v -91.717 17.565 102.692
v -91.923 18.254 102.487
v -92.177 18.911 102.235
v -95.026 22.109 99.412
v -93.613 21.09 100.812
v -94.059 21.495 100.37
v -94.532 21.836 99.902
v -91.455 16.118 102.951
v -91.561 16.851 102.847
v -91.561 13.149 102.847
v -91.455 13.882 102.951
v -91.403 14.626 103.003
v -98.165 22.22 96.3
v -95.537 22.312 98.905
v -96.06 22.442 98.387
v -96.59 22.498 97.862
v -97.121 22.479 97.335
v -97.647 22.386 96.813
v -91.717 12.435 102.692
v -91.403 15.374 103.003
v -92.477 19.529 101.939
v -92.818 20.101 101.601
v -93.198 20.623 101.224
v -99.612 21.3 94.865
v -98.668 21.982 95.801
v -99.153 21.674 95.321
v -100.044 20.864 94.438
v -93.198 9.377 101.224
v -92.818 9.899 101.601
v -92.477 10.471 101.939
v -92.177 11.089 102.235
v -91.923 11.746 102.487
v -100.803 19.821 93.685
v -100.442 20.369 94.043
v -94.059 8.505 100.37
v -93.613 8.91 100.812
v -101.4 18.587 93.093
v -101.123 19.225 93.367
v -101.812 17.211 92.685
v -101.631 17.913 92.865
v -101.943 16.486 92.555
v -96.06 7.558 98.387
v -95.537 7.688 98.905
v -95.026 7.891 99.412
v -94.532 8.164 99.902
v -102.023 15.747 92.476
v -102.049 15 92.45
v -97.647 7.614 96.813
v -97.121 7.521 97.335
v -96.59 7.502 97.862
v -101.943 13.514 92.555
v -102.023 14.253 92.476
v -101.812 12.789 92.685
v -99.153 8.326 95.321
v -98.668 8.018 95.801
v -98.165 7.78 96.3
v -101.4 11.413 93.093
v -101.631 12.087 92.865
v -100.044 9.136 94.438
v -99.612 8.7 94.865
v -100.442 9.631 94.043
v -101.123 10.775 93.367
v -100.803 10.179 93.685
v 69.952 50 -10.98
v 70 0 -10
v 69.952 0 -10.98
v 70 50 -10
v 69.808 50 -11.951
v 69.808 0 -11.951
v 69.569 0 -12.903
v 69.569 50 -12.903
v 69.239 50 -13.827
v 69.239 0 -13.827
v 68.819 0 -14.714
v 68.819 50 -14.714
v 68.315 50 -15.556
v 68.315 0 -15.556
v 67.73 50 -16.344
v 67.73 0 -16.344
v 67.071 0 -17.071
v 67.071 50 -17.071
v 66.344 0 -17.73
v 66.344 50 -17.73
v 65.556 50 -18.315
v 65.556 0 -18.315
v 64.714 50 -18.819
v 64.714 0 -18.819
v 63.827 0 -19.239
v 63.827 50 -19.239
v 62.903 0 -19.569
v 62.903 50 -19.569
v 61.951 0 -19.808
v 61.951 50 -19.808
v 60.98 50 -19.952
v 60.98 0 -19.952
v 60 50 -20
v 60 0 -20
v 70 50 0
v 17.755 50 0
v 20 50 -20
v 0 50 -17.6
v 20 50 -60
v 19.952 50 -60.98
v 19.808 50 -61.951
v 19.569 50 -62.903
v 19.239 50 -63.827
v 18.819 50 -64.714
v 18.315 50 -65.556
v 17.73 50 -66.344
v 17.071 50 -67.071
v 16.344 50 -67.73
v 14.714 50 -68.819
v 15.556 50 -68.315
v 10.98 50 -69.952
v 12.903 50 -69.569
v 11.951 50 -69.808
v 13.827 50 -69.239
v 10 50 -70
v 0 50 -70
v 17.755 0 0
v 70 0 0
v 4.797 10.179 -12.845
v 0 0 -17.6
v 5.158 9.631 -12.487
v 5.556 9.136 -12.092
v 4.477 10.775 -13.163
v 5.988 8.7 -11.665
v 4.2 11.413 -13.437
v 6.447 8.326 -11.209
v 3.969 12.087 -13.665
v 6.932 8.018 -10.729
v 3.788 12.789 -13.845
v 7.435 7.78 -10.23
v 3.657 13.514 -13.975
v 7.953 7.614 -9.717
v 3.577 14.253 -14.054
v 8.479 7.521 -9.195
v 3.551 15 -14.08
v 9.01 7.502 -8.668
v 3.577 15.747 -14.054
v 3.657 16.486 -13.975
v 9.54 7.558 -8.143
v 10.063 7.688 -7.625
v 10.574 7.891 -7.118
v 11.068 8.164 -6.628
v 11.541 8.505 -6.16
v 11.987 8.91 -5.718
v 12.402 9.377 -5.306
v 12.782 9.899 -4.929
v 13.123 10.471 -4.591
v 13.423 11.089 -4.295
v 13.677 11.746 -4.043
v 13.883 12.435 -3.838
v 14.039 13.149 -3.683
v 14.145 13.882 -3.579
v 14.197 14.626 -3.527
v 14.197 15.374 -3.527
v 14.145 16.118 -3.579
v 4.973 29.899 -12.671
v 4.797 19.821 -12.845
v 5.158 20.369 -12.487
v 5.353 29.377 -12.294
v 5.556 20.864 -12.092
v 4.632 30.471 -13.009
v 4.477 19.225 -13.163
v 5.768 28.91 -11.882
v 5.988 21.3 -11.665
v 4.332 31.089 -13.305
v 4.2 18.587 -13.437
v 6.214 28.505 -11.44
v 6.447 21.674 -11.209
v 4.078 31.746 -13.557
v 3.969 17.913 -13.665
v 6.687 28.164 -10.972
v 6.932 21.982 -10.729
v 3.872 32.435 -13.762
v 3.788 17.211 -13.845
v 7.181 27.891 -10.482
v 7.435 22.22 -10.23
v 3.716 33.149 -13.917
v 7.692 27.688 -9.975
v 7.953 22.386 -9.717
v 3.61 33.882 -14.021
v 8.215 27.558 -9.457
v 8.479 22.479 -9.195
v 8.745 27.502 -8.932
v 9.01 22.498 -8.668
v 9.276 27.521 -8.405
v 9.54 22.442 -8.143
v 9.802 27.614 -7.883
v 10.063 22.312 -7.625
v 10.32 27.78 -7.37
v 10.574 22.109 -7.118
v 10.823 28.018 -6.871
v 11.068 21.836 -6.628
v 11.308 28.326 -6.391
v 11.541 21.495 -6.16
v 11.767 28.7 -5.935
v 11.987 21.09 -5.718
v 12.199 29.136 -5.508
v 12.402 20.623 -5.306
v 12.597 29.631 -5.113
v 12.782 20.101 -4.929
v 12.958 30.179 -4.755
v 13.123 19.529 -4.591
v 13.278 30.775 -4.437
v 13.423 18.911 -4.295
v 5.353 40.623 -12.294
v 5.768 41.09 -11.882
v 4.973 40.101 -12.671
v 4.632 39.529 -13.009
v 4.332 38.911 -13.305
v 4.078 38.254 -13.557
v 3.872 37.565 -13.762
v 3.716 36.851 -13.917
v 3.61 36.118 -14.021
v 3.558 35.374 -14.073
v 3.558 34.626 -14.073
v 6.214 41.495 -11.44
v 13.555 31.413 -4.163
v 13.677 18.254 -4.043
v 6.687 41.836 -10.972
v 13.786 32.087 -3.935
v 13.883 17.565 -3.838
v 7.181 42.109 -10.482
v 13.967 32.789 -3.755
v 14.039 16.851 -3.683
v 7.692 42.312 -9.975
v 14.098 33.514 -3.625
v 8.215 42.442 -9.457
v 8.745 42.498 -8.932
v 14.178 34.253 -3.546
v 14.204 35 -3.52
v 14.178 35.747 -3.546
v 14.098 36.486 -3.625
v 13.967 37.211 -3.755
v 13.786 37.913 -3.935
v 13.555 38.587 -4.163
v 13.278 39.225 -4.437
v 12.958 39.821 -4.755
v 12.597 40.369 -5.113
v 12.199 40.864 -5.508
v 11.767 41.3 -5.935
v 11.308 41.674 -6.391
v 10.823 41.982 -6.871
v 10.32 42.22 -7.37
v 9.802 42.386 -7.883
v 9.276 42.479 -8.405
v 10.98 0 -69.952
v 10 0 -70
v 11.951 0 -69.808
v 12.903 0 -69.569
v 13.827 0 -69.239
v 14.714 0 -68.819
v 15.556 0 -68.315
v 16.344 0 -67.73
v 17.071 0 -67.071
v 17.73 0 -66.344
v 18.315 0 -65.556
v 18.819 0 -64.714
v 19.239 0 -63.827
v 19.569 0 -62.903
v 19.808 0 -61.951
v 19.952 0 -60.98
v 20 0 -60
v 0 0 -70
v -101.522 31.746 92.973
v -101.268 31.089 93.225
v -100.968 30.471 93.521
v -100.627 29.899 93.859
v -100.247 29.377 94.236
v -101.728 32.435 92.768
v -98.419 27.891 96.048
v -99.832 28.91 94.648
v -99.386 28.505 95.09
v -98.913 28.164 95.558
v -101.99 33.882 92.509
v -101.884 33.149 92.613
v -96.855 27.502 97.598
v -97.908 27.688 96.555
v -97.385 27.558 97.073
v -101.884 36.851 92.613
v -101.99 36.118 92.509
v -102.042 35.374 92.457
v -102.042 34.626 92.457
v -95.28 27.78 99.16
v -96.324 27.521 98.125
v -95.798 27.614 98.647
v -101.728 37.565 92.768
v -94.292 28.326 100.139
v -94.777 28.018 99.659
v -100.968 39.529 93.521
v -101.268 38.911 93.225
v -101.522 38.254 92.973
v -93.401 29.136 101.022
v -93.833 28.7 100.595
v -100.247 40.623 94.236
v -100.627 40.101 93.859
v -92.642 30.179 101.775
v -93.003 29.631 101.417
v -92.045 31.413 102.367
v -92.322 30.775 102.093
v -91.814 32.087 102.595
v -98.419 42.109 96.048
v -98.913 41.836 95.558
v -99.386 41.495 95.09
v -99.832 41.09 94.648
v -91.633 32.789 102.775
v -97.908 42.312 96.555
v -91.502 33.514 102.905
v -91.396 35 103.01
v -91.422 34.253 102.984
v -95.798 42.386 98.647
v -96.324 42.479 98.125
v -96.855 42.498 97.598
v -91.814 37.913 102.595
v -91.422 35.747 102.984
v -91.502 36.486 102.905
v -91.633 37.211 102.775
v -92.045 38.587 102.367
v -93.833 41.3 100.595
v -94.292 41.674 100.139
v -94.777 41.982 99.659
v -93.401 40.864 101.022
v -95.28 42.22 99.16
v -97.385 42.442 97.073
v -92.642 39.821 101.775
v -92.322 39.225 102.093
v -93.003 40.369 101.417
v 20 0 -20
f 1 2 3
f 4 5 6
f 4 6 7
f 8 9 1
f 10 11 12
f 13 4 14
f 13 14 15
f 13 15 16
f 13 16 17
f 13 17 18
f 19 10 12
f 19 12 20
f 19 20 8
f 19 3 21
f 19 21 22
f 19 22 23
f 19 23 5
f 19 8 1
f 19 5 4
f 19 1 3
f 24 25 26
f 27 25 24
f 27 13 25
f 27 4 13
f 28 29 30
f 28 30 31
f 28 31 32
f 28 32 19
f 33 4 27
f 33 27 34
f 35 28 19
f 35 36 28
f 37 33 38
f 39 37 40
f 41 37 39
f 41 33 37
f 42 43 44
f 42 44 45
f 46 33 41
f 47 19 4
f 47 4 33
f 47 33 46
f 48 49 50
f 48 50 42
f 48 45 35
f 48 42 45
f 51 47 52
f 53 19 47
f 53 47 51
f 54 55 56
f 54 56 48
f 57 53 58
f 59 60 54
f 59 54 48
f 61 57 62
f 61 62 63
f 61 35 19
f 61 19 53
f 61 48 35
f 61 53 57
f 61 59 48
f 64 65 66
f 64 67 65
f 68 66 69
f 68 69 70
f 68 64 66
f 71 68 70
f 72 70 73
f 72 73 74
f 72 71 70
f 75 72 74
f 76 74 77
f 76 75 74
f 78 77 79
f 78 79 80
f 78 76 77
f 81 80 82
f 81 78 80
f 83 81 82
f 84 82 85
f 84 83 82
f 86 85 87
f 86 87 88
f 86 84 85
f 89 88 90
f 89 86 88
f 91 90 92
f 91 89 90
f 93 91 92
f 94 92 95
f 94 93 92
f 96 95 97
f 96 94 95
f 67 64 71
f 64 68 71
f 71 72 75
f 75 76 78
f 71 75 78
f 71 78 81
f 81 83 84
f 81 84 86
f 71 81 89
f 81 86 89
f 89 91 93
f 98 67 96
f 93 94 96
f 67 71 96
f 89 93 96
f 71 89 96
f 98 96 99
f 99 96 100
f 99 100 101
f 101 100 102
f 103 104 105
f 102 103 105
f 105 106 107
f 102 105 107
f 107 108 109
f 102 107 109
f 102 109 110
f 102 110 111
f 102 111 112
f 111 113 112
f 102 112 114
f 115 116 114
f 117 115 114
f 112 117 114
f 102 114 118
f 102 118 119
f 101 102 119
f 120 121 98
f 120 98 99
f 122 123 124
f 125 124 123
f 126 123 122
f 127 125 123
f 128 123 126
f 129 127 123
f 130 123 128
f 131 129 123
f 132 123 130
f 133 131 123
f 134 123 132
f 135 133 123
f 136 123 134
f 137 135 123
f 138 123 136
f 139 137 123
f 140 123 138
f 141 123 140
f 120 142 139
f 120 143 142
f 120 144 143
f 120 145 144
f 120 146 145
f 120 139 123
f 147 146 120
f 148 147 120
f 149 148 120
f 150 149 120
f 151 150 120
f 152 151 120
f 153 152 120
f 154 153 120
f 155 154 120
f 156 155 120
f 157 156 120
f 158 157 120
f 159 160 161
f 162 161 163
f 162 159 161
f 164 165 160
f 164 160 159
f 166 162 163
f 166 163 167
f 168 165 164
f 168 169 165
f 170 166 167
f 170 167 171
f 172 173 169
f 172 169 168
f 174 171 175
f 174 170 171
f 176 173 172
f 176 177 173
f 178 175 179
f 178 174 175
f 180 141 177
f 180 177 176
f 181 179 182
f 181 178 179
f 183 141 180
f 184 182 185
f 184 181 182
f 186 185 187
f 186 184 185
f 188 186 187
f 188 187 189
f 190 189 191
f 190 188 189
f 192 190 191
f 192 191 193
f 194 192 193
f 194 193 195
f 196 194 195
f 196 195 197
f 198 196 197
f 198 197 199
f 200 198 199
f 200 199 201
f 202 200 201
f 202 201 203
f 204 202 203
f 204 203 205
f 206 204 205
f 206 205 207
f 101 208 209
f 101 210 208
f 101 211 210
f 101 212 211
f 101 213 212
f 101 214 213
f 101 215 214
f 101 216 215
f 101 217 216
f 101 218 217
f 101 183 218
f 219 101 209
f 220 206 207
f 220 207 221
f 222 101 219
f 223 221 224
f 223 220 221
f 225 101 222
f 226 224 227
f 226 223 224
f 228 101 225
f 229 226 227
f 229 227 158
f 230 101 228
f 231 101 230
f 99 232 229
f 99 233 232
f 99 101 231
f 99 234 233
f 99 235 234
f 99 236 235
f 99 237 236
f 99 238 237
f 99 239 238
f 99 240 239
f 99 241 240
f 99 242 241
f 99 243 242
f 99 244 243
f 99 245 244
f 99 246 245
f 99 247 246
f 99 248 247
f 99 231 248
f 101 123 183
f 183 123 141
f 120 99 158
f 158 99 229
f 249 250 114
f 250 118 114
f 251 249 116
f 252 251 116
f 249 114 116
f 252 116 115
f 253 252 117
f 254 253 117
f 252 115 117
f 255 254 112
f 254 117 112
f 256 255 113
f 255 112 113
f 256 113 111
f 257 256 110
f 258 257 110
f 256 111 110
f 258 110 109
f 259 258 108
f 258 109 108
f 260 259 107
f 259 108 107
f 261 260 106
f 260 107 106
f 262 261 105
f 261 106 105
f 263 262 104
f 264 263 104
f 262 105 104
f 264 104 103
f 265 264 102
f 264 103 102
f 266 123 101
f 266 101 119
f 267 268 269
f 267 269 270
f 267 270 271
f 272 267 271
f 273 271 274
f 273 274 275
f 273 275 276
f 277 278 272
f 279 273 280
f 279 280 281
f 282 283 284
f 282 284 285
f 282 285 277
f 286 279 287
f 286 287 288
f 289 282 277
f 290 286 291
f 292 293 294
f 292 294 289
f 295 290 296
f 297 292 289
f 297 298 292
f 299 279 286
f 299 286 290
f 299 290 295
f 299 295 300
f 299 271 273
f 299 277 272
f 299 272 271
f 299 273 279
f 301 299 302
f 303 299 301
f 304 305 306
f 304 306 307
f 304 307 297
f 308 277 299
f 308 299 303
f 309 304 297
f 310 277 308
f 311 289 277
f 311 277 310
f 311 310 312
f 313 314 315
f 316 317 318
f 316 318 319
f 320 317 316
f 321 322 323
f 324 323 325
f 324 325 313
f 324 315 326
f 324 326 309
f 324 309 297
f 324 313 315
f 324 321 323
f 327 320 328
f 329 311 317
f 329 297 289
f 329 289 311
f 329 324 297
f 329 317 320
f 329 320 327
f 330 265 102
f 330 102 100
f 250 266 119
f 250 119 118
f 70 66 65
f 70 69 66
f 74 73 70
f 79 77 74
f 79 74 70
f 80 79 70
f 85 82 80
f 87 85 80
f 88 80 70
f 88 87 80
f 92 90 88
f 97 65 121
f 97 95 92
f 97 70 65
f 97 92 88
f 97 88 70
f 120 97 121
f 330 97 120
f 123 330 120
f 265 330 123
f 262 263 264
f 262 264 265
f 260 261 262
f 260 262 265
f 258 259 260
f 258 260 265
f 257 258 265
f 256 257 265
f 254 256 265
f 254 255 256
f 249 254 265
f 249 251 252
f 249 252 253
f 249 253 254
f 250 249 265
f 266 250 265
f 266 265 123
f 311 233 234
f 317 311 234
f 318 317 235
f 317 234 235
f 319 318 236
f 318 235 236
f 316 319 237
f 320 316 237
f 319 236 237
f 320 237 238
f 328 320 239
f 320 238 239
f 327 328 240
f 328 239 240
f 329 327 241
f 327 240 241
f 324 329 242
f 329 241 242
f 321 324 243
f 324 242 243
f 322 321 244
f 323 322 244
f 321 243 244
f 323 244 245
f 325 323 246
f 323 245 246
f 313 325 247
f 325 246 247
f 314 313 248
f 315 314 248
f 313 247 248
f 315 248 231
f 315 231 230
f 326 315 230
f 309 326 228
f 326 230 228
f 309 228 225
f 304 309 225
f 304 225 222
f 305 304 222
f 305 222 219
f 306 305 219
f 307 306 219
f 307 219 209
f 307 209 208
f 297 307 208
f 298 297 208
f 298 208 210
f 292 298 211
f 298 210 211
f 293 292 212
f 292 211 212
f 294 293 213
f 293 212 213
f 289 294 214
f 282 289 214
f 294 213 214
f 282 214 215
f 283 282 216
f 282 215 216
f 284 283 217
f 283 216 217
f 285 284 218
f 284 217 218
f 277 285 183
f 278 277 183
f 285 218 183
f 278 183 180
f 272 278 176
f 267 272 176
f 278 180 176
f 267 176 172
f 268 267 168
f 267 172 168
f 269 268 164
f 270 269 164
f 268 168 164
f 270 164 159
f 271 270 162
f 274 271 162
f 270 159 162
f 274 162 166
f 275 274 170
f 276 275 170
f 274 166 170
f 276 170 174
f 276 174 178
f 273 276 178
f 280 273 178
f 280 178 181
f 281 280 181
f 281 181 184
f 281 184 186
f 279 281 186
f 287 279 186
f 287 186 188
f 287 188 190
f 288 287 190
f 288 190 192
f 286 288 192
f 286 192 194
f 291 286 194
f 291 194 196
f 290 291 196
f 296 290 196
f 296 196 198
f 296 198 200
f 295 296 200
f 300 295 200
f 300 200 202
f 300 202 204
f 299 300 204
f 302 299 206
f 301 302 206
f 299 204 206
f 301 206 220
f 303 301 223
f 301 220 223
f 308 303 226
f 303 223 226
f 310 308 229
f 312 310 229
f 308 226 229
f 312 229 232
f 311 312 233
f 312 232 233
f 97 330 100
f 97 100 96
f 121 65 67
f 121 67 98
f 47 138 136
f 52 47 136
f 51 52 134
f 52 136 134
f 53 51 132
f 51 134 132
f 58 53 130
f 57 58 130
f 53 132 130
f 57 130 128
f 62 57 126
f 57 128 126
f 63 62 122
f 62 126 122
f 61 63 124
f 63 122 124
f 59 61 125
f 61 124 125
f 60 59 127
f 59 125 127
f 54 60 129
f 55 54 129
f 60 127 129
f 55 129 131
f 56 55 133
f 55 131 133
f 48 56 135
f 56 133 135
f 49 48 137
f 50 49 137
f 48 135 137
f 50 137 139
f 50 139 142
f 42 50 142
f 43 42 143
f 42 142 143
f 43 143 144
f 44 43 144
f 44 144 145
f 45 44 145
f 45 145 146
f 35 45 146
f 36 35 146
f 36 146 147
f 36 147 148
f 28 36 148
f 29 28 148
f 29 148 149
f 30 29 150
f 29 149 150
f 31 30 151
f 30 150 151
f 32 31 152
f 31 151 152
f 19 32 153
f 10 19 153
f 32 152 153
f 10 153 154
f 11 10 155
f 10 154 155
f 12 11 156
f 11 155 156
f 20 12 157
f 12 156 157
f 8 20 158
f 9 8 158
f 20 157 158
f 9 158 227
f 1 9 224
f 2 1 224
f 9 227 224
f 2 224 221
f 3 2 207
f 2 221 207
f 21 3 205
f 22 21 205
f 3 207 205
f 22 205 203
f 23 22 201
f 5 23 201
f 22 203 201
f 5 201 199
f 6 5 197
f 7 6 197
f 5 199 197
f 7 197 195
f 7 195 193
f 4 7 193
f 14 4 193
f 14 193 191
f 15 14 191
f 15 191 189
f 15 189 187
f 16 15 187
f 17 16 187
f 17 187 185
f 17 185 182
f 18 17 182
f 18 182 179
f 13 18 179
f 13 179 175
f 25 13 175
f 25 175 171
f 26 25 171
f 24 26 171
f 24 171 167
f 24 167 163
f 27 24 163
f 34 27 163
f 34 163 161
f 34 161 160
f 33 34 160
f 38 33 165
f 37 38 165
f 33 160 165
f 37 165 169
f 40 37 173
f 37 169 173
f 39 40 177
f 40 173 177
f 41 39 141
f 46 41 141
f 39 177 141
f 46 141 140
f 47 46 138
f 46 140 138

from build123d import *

# Parameters (mm, degrees)
BOSS_EXTRUDE1_DEPTH = 50
CUT_EXTRUDE1_DEPTH  = 50
SKETCH3_R           = 7.5
BOSS_EXTRUDE2_DEPTH = 150
FILLET1_R           = 10


with BuildPart() as part:
    # Sketch1 → Boss-Extrude1 (new body)
    with BuildSketch(Plane(origin=(0, 0, 0), x_dir=(1, 0, 0), z_dir=(0, 1, 0))):
        Polygon((0, 0), (0, 70), (20, 70), (20, 20), (70, 20), (70, 0), align=None)
    extrude(amount=BOSS_EXTRUDE1_DEPTH)

    # Sketch2 → Cut-Extrude1 (cut)
    with BuildSketch(Plane(origin=(0, 50, 0), x_dir=(1, 0, 0), z_dir=(0, 1, 0))):
        Polygon((0, 17.6), (17.754999296, 0), (0, 0), align=None)
    extrude(amount=-CUT_EXTRUDE1_DEPTH, mode=Mode.SUBTRACT)

    # Sketch3 → Boss-Extrude2 (add)
    with BuildSketch(Plane(origin=(8.799661731, 0, -8.8771584), x_dir=(0.7101999718389179, 0, 0.7040000000000001), z_dir=(-0.7040000000000001, 0, 0.7101999718389179))):
        with Locations((0.1096, 35)):
            Circle(SKETCH3_R)
        with Locations(Location((0.1096, 15, 0), (0, 0, 180))):
            Circle(SKETCH3_R)
    extrude(amount=BOSS_EXTRUDE2_DEPTH)

    # Fillet1
    fillet1_edges = [part.edges().sort_by_distance(p)[0] for p in [
        (20, 25, -70),
        (70, 25, -20),
    ]]
    fillet(fillet1_edges, radius=FILLET1_R)


solid = part.part
